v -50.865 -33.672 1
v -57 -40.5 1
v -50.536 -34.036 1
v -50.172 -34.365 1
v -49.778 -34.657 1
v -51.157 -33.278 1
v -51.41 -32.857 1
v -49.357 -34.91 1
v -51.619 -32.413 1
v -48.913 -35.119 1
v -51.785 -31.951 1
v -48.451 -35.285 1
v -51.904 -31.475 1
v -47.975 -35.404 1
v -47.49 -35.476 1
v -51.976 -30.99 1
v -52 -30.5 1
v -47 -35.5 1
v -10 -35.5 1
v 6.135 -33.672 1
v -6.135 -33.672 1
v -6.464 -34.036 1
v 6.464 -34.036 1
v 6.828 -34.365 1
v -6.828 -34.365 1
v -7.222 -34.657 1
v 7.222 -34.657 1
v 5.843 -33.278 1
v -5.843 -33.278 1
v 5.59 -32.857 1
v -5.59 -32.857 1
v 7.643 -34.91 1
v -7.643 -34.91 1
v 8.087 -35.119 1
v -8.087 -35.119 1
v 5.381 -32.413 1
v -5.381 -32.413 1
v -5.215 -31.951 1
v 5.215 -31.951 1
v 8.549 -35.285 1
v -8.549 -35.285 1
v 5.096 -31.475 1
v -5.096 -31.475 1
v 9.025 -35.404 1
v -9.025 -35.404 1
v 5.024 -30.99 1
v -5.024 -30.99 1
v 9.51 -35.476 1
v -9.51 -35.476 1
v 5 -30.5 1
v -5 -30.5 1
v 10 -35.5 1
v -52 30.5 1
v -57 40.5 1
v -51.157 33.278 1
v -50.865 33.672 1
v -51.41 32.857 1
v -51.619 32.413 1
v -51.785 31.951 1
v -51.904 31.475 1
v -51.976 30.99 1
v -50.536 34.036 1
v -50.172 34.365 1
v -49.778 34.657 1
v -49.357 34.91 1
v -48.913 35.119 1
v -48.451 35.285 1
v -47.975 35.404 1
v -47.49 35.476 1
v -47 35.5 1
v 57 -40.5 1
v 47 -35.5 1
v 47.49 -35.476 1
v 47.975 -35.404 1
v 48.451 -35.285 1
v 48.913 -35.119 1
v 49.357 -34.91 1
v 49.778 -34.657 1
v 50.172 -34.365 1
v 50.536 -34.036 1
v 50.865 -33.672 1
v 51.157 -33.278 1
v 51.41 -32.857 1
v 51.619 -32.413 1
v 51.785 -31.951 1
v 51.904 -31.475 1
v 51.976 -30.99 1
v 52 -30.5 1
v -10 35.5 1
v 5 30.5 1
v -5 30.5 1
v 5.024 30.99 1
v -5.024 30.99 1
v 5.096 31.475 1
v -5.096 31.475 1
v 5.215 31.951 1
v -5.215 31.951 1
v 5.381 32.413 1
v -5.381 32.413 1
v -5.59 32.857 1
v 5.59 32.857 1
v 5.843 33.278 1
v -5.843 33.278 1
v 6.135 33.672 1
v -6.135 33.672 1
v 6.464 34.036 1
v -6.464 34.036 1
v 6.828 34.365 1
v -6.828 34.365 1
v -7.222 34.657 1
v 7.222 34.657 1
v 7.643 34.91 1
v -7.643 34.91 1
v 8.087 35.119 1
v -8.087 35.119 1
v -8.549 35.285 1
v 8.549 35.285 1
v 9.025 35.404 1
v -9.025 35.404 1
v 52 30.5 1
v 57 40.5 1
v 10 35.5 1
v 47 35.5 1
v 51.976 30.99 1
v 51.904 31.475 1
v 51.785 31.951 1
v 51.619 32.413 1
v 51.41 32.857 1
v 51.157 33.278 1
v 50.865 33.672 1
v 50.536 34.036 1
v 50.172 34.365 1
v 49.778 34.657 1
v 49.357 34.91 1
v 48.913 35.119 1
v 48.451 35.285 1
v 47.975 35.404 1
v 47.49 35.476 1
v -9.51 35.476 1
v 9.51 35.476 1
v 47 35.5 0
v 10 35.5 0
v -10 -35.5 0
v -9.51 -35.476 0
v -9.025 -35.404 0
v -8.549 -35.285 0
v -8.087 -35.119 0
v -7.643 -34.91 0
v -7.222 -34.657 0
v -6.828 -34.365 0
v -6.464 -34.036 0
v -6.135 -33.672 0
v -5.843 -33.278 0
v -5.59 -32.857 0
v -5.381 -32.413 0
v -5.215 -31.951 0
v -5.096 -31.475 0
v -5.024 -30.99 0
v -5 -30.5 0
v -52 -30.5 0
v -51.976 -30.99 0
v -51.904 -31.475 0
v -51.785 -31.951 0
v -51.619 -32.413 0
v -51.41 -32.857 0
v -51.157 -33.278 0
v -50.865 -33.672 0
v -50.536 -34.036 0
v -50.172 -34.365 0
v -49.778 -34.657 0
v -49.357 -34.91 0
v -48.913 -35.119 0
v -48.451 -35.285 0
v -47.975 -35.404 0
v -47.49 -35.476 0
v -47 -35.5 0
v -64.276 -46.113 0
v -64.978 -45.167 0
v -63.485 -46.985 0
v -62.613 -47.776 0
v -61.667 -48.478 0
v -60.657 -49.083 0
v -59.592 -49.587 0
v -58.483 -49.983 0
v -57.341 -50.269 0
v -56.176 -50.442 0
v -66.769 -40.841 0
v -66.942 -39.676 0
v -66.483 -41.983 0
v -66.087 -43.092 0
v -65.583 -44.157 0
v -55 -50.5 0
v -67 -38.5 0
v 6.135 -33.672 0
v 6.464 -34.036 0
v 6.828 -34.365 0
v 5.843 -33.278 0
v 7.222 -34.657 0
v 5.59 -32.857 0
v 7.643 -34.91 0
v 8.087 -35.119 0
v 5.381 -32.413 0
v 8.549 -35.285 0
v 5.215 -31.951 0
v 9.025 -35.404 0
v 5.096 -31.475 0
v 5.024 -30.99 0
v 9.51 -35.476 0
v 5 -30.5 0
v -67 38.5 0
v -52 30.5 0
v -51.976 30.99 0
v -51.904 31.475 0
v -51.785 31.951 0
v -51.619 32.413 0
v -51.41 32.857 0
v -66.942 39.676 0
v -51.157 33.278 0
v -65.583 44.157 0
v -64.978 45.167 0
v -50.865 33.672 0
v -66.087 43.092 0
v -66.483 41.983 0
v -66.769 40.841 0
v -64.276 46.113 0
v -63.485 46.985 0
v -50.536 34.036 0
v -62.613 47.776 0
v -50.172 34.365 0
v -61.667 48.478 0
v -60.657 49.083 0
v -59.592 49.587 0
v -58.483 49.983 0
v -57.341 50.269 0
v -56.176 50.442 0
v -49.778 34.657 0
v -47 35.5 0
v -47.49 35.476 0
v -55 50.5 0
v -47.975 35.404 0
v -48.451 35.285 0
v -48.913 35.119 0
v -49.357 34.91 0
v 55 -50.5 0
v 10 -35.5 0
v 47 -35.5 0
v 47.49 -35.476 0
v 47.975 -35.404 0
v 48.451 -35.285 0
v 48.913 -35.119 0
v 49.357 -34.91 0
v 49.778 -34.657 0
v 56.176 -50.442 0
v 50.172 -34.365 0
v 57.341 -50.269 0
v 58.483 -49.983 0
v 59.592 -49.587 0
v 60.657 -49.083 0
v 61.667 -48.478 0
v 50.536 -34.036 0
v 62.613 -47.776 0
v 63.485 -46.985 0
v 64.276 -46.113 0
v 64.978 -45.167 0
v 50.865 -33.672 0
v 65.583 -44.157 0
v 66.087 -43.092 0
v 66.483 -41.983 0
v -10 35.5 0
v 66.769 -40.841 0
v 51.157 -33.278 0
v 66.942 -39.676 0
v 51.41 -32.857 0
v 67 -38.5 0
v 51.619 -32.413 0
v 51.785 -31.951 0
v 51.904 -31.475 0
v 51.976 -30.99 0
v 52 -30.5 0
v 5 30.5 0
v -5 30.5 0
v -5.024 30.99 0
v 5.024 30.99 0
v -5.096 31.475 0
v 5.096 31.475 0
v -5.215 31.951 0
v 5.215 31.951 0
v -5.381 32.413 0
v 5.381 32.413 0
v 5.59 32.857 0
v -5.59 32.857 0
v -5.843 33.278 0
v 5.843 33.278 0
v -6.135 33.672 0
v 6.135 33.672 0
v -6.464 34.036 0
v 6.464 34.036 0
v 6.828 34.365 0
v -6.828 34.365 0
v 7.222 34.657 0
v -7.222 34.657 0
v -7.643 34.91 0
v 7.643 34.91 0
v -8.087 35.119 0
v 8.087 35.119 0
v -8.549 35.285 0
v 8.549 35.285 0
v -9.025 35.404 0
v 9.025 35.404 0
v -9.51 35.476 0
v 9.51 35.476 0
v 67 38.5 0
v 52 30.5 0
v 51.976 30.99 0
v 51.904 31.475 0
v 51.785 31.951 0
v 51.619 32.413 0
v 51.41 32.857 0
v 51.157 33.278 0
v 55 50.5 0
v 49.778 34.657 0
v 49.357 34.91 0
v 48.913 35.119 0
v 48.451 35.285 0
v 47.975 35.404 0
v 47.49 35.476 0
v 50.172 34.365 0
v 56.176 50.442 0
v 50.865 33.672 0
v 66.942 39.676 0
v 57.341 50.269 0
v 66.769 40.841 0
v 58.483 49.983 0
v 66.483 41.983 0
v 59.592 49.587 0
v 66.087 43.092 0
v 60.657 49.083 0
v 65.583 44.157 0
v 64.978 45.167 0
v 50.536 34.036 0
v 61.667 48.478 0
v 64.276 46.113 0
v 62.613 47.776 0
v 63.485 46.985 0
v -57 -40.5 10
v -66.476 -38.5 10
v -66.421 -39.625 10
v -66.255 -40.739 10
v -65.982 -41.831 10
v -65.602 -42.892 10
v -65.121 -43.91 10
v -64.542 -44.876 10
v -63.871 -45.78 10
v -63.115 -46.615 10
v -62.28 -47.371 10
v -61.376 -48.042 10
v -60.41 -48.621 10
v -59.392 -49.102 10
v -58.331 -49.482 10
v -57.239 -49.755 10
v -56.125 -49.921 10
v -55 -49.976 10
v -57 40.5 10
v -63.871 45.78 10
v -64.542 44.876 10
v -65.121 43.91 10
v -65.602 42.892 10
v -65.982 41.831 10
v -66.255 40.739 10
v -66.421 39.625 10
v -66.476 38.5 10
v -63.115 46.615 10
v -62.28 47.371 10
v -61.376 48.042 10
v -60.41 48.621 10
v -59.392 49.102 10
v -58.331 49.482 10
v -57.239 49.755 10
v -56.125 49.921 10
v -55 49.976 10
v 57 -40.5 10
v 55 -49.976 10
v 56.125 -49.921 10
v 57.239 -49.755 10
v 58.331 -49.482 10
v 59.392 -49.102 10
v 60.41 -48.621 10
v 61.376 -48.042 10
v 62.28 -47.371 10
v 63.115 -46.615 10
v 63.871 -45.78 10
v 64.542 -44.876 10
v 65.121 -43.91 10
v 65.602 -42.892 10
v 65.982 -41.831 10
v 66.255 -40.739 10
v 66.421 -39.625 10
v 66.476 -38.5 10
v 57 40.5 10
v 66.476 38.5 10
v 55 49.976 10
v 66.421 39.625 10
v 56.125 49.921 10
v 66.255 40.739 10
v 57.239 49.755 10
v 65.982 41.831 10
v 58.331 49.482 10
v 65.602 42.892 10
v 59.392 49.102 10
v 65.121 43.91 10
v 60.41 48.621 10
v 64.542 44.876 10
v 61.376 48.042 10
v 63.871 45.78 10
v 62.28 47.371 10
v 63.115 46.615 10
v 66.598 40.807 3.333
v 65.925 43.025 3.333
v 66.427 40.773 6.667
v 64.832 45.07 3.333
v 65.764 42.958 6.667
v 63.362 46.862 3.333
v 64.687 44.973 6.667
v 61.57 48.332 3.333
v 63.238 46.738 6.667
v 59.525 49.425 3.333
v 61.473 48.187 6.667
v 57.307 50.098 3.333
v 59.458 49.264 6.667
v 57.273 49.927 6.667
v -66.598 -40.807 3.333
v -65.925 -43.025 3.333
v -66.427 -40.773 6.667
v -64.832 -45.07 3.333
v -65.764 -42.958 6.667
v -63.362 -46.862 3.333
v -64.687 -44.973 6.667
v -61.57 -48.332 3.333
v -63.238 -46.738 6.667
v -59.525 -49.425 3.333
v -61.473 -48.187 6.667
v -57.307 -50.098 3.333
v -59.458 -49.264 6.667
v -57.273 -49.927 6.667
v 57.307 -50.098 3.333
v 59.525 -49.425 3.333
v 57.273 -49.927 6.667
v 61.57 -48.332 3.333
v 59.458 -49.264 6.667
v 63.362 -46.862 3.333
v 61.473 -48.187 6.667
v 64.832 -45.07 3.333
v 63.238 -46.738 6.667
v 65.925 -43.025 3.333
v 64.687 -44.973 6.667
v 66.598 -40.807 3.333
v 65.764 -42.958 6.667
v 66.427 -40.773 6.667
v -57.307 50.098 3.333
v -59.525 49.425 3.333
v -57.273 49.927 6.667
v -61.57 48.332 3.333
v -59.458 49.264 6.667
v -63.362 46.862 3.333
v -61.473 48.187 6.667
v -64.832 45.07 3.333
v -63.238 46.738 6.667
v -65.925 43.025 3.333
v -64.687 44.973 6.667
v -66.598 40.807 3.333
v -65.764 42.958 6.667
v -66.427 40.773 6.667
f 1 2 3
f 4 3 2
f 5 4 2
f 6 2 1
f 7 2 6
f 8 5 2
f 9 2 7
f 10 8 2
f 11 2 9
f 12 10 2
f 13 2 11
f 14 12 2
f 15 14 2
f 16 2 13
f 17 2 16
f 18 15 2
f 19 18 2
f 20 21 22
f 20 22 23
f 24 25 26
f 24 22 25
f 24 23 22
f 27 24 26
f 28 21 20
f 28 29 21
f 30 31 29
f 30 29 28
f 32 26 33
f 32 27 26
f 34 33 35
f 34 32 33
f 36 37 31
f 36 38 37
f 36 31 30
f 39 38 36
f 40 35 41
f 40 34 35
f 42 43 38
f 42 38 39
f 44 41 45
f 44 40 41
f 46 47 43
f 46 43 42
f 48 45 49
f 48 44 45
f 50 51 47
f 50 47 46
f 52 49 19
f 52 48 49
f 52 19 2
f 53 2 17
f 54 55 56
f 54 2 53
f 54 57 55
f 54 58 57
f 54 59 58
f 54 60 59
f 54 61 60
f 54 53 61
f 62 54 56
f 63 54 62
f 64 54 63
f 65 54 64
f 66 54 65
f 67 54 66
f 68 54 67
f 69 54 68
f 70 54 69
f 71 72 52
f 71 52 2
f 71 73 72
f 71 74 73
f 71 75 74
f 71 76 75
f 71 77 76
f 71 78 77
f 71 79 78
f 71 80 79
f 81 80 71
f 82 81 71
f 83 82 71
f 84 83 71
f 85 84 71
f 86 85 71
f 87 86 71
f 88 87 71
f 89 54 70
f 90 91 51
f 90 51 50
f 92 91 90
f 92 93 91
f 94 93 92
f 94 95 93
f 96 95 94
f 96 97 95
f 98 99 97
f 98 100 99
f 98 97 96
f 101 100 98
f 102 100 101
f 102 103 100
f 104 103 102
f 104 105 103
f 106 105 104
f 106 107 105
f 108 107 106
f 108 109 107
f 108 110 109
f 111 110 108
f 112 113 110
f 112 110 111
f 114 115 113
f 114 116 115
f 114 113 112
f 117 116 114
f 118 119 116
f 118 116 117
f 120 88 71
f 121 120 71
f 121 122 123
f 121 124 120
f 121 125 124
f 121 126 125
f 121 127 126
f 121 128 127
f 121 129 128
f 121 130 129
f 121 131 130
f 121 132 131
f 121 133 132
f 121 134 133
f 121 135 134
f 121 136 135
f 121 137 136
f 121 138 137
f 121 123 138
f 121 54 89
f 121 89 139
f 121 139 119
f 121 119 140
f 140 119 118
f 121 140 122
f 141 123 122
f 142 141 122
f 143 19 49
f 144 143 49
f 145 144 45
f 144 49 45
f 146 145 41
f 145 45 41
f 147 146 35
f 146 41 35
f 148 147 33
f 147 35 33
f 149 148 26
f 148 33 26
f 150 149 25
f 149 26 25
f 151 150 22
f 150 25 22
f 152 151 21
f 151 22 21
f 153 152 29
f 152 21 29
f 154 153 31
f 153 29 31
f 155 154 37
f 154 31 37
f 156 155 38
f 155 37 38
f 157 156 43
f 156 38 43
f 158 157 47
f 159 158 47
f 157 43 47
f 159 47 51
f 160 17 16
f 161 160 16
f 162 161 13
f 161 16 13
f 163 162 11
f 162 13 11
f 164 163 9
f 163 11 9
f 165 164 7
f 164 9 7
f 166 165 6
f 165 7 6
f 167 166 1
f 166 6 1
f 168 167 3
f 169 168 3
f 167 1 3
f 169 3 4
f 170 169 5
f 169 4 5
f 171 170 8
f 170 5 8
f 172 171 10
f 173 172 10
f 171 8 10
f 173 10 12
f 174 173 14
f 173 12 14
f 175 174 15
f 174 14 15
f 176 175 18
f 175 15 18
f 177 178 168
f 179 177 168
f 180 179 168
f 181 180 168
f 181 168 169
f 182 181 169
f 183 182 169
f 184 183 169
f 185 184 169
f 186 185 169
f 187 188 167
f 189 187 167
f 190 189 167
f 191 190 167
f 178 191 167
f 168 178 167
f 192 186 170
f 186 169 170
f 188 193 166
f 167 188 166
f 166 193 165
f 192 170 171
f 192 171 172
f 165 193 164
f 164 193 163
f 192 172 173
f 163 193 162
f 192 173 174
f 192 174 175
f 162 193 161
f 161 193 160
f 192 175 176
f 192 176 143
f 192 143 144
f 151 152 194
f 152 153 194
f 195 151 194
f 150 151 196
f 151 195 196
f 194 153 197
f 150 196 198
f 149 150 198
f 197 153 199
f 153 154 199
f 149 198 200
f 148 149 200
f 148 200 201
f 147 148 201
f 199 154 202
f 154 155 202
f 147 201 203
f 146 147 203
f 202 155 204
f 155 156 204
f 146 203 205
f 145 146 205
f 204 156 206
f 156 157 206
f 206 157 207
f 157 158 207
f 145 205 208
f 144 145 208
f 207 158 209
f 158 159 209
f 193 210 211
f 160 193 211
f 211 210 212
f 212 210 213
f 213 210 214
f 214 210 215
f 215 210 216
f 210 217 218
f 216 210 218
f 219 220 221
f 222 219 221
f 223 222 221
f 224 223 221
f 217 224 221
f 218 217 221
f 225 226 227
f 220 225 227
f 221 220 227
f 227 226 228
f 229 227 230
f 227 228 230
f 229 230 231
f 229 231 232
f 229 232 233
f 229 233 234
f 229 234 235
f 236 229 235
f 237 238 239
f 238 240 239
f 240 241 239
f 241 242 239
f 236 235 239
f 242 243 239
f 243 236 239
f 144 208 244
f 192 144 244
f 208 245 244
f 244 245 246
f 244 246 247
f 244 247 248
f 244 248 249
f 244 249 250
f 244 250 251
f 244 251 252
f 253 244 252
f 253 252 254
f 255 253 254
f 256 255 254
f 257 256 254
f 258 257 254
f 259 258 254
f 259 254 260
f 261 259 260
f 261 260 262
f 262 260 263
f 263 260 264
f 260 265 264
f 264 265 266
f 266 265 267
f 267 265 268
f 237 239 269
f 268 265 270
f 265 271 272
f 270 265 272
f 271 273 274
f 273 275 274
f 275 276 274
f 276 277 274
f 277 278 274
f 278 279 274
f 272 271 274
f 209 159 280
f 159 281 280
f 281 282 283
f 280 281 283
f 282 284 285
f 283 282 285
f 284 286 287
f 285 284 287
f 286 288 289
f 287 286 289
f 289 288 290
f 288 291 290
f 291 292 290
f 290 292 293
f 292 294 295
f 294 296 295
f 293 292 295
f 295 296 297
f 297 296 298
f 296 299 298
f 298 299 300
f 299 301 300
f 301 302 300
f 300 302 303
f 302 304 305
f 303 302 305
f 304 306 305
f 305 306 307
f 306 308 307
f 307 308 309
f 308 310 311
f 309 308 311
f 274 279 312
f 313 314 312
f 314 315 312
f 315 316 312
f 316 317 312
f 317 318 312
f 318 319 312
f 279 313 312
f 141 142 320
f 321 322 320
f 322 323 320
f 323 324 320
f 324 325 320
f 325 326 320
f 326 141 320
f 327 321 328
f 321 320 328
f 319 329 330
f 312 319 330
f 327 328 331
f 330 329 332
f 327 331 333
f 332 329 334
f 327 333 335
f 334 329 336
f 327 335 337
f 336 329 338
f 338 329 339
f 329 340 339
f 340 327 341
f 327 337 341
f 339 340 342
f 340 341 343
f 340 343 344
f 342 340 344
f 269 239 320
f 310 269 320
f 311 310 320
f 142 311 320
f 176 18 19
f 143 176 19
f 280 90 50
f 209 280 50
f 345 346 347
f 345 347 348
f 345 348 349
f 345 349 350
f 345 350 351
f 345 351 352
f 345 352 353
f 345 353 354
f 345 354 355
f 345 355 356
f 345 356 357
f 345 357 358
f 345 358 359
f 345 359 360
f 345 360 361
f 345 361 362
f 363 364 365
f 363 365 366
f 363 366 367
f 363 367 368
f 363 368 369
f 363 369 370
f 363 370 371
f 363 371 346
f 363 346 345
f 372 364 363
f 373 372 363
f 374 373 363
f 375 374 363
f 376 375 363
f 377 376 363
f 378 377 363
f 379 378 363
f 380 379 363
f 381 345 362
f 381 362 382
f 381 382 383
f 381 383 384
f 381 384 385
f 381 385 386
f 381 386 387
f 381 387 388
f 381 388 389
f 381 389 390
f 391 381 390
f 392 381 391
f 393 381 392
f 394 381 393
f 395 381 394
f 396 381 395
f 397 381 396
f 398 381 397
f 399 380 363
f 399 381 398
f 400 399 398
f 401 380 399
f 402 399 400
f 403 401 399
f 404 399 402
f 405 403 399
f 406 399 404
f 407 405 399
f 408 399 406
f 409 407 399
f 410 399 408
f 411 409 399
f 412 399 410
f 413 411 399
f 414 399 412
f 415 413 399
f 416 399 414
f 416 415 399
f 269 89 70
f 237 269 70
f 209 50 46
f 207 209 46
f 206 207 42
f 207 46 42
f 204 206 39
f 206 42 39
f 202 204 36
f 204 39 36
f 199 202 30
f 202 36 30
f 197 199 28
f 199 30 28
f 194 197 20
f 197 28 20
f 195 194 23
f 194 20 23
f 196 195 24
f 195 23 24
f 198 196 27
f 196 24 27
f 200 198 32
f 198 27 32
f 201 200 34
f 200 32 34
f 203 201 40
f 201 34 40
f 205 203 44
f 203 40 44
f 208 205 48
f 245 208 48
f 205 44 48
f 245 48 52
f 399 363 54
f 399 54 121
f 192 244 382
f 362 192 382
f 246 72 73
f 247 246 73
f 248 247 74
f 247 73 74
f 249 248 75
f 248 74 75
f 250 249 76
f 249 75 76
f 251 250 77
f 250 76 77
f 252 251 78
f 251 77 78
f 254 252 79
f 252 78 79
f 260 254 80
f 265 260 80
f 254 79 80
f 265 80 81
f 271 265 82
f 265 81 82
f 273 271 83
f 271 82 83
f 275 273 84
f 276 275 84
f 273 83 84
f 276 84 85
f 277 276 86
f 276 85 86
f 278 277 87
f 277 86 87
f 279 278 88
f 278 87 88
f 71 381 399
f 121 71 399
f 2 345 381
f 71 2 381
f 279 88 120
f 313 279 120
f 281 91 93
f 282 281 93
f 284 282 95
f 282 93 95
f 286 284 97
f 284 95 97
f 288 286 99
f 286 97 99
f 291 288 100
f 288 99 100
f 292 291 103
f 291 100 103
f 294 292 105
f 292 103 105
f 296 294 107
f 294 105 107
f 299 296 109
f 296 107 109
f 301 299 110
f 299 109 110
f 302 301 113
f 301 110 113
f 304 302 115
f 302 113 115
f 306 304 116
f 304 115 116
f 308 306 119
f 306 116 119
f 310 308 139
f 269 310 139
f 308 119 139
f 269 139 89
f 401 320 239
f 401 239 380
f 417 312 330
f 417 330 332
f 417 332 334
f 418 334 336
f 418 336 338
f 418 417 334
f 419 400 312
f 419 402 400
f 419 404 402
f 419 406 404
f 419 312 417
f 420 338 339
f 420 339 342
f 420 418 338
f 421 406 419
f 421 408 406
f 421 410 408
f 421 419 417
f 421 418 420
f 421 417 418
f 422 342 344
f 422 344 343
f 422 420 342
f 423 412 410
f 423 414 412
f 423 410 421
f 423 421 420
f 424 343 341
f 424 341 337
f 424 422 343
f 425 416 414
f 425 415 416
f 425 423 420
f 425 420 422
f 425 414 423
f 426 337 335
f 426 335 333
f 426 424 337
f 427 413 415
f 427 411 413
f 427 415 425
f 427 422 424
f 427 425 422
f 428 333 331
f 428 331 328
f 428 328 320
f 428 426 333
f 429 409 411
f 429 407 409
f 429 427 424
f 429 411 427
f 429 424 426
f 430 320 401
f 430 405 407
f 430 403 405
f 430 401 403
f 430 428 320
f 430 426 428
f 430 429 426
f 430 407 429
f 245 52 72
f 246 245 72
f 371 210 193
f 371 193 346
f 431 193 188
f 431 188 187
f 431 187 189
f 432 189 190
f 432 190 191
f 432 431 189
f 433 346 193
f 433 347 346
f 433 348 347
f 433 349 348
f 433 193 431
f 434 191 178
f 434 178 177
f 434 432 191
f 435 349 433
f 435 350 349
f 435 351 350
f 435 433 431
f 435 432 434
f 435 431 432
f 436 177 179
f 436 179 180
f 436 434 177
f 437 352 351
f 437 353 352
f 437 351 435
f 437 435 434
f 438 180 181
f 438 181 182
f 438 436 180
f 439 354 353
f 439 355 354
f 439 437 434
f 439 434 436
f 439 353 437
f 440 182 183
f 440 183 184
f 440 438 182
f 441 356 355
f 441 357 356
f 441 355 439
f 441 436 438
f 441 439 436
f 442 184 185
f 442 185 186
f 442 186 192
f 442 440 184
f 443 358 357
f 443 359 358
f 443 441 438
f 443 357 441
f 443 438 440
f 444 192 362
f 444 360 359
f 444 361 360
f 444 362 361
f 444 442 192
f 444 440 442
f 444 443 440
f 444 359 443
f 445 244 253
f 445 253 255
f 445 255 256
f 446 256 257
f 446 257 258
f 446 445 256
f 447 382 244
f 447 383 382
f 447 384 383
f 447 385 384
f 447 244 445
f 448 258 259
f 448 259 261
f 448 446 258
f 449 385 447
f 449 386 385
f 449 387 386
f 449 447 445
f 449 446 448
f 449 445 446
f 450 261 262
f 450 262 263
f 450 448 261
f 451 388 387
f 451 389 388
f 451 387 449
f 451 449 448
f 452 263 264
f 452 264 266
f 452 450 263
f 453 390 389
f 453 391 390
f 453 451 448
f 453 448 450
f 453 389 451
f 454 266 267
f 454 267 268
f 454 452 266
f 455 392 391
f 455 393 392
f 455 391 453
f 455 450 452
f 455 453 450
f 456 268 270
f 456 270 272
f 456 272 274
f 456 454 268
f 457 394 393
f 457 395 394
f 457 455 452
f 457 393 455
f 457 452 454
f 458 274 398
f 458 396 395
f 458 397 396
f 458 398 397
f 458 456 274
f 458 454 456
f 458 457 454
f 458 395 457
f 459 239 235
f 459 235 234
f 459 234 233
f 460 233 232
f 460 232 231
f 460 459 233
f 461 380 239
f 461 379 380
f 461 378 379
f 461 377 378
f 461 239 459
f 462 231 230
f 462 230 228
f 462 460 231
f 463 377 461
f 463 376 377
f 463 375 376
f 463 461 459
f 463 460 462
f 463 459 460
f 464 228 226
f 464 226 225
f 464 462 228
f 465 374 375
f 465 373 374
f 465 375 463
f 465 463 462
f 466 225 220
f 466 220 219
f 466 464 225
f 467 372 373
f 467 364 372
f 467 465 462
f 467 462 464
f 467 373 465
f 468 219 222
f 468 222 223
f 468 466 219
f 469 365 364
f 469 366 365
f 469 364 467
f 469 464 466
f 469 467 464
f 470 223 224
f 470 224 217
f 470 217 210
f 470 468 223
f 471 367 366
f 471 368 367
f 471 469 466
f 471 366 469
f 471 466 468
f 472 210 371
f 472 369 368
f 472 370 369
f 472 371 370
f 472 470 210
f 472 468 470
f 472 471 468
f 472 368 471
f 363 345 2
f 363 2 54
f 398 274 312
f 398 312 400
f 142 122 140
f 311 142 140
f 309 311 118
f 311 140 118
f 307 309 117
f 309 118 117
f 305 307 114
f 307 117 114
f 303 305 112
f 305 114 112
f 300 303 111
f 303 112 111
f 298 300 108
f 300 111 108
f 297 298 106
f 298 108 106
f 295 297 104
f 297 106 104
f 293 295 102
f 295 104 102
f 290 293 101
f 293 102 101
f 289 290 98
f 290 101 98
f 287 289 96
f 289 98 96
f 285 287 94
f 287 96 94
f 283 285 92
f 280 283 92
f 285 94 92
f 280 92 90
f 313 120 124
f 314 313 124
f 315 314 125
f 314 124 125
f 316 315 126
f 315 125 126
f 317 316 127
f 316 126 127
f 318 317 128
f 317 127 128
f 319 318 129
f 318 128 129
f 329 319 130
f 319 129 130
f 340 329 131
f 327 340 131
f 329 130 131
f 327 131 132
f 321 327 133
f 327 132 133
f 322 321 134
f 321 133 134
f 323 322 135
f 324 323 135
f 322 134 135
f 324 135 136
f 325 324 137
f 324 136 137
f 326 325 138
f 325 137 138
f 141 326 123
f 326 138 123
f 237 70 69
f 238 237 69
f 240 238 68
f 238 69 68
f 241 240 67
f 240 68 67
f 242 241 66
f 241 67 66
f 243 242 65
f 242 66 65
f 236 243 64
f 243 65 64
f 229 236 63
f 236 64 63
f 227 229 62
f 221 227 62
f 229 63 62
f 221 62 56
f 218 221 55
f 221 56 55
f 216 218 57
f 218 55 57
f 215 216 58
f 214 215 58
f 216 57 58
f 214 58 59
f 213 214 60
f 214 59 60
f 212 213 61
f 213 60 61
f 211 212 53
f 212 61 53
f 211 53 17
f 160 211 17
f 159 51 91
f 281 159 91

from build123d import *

# Parameters (mm, degrees)
F1_DEPTH = 10
F1_TAPER = 3
F2_W     = 114
F2_H     = 81
F3_DEPTH = 9
F5_DEPTH = 1


with BuildPart() as f1:
    # F0 (on Top) → F1 (new body)
    with BuildSketch(Plane.XY):
        with BuildLine():
            Line((55, 50.5), (-55, 50.5))
            ThreePointArc((-55, 50.5), (-63.4852813742, 46.9852813742), (-67, 38.5))
            Line((-67, 38.5), (-67, -38.5))
            ThreePointArc((-67, -38.5), (-63.4852813742, -46.9852813742), (-55, -50.5))
            Line((-55, -50.5), (55, -50.5))
            ThreePointArc((55, -50.5), (63.4852813742, -46.9852813742), (67, -38.5))
            Line((67, -38.5), (67, 38.5))
            ThreePointArc((67, 38.5), (63.4852813742, 46.9852813742), (55, 50.5))
        make_face()
    extrude(amount=F1_DEPTH, taper=F1_TAPER)

    # F2 (on face) → F3 (cut)
    with BuildSketch(Plane.XY.offset(10)):
        Rectangle(F2_W, F2_H)
    extrude(amount=-F3_DEPTH, mode=Mode.SUBTRACT)

    # F4 (on face) → F5 (cut, through all)
    with BuildSketch(Plane.XY.offset(1)):
        with BuildLine():
            ThreePointArc((52, 30.5), (50.5355339059, 34.0355339059), (47, 35.5))
            Line((47, 35.5), (10, 35.5))
            ThreePointArc((10, 35.5), (6.4644660941, 34.0355339059), (5, 30.5))
            Line((5, 30.5), (5, -30.5))
            ThreePointArc((5, -30.5), (6.4644660941, -34.0355339059), (10, -35.5))
            Line((10, -35.5), (47, -35.5))
            ThreePointArc((47, -35.5), (50.5355339059, -34.0355339059), (52, -30.5))
            Line((52, -30.5), (52, 30.5))
        make_face()
        with BuildLine():
            Line((-5, -30.5), (-5, 30.5))
            ThreePointArc((-5, 30.5), (-6.4644660941, 34.0355339059), (-10, 35.5))
            Line((-10, 35.5), (-47, 35.5))
            ThreePointArc((-47, 35.5), (-50.5355339059, 34.0355339059), (-52, 30.5))
            Line((-52, 30.5), (-52, -30.5))
            ThreePointArc((-52, -30.5), (-50.5355339059, -34.0355339059), (-47, -35.5))
            Line((-47, -35.5), (-10, -35.5))
            ThreePointArc((-10, -35.5), (-6.4644660941, -34.0355339059), (-5, -30.5))
        make_face()
    extrude(amount=-F5_DEPTH, mode=Mode.SUBTRACT)


solid = f1.part
